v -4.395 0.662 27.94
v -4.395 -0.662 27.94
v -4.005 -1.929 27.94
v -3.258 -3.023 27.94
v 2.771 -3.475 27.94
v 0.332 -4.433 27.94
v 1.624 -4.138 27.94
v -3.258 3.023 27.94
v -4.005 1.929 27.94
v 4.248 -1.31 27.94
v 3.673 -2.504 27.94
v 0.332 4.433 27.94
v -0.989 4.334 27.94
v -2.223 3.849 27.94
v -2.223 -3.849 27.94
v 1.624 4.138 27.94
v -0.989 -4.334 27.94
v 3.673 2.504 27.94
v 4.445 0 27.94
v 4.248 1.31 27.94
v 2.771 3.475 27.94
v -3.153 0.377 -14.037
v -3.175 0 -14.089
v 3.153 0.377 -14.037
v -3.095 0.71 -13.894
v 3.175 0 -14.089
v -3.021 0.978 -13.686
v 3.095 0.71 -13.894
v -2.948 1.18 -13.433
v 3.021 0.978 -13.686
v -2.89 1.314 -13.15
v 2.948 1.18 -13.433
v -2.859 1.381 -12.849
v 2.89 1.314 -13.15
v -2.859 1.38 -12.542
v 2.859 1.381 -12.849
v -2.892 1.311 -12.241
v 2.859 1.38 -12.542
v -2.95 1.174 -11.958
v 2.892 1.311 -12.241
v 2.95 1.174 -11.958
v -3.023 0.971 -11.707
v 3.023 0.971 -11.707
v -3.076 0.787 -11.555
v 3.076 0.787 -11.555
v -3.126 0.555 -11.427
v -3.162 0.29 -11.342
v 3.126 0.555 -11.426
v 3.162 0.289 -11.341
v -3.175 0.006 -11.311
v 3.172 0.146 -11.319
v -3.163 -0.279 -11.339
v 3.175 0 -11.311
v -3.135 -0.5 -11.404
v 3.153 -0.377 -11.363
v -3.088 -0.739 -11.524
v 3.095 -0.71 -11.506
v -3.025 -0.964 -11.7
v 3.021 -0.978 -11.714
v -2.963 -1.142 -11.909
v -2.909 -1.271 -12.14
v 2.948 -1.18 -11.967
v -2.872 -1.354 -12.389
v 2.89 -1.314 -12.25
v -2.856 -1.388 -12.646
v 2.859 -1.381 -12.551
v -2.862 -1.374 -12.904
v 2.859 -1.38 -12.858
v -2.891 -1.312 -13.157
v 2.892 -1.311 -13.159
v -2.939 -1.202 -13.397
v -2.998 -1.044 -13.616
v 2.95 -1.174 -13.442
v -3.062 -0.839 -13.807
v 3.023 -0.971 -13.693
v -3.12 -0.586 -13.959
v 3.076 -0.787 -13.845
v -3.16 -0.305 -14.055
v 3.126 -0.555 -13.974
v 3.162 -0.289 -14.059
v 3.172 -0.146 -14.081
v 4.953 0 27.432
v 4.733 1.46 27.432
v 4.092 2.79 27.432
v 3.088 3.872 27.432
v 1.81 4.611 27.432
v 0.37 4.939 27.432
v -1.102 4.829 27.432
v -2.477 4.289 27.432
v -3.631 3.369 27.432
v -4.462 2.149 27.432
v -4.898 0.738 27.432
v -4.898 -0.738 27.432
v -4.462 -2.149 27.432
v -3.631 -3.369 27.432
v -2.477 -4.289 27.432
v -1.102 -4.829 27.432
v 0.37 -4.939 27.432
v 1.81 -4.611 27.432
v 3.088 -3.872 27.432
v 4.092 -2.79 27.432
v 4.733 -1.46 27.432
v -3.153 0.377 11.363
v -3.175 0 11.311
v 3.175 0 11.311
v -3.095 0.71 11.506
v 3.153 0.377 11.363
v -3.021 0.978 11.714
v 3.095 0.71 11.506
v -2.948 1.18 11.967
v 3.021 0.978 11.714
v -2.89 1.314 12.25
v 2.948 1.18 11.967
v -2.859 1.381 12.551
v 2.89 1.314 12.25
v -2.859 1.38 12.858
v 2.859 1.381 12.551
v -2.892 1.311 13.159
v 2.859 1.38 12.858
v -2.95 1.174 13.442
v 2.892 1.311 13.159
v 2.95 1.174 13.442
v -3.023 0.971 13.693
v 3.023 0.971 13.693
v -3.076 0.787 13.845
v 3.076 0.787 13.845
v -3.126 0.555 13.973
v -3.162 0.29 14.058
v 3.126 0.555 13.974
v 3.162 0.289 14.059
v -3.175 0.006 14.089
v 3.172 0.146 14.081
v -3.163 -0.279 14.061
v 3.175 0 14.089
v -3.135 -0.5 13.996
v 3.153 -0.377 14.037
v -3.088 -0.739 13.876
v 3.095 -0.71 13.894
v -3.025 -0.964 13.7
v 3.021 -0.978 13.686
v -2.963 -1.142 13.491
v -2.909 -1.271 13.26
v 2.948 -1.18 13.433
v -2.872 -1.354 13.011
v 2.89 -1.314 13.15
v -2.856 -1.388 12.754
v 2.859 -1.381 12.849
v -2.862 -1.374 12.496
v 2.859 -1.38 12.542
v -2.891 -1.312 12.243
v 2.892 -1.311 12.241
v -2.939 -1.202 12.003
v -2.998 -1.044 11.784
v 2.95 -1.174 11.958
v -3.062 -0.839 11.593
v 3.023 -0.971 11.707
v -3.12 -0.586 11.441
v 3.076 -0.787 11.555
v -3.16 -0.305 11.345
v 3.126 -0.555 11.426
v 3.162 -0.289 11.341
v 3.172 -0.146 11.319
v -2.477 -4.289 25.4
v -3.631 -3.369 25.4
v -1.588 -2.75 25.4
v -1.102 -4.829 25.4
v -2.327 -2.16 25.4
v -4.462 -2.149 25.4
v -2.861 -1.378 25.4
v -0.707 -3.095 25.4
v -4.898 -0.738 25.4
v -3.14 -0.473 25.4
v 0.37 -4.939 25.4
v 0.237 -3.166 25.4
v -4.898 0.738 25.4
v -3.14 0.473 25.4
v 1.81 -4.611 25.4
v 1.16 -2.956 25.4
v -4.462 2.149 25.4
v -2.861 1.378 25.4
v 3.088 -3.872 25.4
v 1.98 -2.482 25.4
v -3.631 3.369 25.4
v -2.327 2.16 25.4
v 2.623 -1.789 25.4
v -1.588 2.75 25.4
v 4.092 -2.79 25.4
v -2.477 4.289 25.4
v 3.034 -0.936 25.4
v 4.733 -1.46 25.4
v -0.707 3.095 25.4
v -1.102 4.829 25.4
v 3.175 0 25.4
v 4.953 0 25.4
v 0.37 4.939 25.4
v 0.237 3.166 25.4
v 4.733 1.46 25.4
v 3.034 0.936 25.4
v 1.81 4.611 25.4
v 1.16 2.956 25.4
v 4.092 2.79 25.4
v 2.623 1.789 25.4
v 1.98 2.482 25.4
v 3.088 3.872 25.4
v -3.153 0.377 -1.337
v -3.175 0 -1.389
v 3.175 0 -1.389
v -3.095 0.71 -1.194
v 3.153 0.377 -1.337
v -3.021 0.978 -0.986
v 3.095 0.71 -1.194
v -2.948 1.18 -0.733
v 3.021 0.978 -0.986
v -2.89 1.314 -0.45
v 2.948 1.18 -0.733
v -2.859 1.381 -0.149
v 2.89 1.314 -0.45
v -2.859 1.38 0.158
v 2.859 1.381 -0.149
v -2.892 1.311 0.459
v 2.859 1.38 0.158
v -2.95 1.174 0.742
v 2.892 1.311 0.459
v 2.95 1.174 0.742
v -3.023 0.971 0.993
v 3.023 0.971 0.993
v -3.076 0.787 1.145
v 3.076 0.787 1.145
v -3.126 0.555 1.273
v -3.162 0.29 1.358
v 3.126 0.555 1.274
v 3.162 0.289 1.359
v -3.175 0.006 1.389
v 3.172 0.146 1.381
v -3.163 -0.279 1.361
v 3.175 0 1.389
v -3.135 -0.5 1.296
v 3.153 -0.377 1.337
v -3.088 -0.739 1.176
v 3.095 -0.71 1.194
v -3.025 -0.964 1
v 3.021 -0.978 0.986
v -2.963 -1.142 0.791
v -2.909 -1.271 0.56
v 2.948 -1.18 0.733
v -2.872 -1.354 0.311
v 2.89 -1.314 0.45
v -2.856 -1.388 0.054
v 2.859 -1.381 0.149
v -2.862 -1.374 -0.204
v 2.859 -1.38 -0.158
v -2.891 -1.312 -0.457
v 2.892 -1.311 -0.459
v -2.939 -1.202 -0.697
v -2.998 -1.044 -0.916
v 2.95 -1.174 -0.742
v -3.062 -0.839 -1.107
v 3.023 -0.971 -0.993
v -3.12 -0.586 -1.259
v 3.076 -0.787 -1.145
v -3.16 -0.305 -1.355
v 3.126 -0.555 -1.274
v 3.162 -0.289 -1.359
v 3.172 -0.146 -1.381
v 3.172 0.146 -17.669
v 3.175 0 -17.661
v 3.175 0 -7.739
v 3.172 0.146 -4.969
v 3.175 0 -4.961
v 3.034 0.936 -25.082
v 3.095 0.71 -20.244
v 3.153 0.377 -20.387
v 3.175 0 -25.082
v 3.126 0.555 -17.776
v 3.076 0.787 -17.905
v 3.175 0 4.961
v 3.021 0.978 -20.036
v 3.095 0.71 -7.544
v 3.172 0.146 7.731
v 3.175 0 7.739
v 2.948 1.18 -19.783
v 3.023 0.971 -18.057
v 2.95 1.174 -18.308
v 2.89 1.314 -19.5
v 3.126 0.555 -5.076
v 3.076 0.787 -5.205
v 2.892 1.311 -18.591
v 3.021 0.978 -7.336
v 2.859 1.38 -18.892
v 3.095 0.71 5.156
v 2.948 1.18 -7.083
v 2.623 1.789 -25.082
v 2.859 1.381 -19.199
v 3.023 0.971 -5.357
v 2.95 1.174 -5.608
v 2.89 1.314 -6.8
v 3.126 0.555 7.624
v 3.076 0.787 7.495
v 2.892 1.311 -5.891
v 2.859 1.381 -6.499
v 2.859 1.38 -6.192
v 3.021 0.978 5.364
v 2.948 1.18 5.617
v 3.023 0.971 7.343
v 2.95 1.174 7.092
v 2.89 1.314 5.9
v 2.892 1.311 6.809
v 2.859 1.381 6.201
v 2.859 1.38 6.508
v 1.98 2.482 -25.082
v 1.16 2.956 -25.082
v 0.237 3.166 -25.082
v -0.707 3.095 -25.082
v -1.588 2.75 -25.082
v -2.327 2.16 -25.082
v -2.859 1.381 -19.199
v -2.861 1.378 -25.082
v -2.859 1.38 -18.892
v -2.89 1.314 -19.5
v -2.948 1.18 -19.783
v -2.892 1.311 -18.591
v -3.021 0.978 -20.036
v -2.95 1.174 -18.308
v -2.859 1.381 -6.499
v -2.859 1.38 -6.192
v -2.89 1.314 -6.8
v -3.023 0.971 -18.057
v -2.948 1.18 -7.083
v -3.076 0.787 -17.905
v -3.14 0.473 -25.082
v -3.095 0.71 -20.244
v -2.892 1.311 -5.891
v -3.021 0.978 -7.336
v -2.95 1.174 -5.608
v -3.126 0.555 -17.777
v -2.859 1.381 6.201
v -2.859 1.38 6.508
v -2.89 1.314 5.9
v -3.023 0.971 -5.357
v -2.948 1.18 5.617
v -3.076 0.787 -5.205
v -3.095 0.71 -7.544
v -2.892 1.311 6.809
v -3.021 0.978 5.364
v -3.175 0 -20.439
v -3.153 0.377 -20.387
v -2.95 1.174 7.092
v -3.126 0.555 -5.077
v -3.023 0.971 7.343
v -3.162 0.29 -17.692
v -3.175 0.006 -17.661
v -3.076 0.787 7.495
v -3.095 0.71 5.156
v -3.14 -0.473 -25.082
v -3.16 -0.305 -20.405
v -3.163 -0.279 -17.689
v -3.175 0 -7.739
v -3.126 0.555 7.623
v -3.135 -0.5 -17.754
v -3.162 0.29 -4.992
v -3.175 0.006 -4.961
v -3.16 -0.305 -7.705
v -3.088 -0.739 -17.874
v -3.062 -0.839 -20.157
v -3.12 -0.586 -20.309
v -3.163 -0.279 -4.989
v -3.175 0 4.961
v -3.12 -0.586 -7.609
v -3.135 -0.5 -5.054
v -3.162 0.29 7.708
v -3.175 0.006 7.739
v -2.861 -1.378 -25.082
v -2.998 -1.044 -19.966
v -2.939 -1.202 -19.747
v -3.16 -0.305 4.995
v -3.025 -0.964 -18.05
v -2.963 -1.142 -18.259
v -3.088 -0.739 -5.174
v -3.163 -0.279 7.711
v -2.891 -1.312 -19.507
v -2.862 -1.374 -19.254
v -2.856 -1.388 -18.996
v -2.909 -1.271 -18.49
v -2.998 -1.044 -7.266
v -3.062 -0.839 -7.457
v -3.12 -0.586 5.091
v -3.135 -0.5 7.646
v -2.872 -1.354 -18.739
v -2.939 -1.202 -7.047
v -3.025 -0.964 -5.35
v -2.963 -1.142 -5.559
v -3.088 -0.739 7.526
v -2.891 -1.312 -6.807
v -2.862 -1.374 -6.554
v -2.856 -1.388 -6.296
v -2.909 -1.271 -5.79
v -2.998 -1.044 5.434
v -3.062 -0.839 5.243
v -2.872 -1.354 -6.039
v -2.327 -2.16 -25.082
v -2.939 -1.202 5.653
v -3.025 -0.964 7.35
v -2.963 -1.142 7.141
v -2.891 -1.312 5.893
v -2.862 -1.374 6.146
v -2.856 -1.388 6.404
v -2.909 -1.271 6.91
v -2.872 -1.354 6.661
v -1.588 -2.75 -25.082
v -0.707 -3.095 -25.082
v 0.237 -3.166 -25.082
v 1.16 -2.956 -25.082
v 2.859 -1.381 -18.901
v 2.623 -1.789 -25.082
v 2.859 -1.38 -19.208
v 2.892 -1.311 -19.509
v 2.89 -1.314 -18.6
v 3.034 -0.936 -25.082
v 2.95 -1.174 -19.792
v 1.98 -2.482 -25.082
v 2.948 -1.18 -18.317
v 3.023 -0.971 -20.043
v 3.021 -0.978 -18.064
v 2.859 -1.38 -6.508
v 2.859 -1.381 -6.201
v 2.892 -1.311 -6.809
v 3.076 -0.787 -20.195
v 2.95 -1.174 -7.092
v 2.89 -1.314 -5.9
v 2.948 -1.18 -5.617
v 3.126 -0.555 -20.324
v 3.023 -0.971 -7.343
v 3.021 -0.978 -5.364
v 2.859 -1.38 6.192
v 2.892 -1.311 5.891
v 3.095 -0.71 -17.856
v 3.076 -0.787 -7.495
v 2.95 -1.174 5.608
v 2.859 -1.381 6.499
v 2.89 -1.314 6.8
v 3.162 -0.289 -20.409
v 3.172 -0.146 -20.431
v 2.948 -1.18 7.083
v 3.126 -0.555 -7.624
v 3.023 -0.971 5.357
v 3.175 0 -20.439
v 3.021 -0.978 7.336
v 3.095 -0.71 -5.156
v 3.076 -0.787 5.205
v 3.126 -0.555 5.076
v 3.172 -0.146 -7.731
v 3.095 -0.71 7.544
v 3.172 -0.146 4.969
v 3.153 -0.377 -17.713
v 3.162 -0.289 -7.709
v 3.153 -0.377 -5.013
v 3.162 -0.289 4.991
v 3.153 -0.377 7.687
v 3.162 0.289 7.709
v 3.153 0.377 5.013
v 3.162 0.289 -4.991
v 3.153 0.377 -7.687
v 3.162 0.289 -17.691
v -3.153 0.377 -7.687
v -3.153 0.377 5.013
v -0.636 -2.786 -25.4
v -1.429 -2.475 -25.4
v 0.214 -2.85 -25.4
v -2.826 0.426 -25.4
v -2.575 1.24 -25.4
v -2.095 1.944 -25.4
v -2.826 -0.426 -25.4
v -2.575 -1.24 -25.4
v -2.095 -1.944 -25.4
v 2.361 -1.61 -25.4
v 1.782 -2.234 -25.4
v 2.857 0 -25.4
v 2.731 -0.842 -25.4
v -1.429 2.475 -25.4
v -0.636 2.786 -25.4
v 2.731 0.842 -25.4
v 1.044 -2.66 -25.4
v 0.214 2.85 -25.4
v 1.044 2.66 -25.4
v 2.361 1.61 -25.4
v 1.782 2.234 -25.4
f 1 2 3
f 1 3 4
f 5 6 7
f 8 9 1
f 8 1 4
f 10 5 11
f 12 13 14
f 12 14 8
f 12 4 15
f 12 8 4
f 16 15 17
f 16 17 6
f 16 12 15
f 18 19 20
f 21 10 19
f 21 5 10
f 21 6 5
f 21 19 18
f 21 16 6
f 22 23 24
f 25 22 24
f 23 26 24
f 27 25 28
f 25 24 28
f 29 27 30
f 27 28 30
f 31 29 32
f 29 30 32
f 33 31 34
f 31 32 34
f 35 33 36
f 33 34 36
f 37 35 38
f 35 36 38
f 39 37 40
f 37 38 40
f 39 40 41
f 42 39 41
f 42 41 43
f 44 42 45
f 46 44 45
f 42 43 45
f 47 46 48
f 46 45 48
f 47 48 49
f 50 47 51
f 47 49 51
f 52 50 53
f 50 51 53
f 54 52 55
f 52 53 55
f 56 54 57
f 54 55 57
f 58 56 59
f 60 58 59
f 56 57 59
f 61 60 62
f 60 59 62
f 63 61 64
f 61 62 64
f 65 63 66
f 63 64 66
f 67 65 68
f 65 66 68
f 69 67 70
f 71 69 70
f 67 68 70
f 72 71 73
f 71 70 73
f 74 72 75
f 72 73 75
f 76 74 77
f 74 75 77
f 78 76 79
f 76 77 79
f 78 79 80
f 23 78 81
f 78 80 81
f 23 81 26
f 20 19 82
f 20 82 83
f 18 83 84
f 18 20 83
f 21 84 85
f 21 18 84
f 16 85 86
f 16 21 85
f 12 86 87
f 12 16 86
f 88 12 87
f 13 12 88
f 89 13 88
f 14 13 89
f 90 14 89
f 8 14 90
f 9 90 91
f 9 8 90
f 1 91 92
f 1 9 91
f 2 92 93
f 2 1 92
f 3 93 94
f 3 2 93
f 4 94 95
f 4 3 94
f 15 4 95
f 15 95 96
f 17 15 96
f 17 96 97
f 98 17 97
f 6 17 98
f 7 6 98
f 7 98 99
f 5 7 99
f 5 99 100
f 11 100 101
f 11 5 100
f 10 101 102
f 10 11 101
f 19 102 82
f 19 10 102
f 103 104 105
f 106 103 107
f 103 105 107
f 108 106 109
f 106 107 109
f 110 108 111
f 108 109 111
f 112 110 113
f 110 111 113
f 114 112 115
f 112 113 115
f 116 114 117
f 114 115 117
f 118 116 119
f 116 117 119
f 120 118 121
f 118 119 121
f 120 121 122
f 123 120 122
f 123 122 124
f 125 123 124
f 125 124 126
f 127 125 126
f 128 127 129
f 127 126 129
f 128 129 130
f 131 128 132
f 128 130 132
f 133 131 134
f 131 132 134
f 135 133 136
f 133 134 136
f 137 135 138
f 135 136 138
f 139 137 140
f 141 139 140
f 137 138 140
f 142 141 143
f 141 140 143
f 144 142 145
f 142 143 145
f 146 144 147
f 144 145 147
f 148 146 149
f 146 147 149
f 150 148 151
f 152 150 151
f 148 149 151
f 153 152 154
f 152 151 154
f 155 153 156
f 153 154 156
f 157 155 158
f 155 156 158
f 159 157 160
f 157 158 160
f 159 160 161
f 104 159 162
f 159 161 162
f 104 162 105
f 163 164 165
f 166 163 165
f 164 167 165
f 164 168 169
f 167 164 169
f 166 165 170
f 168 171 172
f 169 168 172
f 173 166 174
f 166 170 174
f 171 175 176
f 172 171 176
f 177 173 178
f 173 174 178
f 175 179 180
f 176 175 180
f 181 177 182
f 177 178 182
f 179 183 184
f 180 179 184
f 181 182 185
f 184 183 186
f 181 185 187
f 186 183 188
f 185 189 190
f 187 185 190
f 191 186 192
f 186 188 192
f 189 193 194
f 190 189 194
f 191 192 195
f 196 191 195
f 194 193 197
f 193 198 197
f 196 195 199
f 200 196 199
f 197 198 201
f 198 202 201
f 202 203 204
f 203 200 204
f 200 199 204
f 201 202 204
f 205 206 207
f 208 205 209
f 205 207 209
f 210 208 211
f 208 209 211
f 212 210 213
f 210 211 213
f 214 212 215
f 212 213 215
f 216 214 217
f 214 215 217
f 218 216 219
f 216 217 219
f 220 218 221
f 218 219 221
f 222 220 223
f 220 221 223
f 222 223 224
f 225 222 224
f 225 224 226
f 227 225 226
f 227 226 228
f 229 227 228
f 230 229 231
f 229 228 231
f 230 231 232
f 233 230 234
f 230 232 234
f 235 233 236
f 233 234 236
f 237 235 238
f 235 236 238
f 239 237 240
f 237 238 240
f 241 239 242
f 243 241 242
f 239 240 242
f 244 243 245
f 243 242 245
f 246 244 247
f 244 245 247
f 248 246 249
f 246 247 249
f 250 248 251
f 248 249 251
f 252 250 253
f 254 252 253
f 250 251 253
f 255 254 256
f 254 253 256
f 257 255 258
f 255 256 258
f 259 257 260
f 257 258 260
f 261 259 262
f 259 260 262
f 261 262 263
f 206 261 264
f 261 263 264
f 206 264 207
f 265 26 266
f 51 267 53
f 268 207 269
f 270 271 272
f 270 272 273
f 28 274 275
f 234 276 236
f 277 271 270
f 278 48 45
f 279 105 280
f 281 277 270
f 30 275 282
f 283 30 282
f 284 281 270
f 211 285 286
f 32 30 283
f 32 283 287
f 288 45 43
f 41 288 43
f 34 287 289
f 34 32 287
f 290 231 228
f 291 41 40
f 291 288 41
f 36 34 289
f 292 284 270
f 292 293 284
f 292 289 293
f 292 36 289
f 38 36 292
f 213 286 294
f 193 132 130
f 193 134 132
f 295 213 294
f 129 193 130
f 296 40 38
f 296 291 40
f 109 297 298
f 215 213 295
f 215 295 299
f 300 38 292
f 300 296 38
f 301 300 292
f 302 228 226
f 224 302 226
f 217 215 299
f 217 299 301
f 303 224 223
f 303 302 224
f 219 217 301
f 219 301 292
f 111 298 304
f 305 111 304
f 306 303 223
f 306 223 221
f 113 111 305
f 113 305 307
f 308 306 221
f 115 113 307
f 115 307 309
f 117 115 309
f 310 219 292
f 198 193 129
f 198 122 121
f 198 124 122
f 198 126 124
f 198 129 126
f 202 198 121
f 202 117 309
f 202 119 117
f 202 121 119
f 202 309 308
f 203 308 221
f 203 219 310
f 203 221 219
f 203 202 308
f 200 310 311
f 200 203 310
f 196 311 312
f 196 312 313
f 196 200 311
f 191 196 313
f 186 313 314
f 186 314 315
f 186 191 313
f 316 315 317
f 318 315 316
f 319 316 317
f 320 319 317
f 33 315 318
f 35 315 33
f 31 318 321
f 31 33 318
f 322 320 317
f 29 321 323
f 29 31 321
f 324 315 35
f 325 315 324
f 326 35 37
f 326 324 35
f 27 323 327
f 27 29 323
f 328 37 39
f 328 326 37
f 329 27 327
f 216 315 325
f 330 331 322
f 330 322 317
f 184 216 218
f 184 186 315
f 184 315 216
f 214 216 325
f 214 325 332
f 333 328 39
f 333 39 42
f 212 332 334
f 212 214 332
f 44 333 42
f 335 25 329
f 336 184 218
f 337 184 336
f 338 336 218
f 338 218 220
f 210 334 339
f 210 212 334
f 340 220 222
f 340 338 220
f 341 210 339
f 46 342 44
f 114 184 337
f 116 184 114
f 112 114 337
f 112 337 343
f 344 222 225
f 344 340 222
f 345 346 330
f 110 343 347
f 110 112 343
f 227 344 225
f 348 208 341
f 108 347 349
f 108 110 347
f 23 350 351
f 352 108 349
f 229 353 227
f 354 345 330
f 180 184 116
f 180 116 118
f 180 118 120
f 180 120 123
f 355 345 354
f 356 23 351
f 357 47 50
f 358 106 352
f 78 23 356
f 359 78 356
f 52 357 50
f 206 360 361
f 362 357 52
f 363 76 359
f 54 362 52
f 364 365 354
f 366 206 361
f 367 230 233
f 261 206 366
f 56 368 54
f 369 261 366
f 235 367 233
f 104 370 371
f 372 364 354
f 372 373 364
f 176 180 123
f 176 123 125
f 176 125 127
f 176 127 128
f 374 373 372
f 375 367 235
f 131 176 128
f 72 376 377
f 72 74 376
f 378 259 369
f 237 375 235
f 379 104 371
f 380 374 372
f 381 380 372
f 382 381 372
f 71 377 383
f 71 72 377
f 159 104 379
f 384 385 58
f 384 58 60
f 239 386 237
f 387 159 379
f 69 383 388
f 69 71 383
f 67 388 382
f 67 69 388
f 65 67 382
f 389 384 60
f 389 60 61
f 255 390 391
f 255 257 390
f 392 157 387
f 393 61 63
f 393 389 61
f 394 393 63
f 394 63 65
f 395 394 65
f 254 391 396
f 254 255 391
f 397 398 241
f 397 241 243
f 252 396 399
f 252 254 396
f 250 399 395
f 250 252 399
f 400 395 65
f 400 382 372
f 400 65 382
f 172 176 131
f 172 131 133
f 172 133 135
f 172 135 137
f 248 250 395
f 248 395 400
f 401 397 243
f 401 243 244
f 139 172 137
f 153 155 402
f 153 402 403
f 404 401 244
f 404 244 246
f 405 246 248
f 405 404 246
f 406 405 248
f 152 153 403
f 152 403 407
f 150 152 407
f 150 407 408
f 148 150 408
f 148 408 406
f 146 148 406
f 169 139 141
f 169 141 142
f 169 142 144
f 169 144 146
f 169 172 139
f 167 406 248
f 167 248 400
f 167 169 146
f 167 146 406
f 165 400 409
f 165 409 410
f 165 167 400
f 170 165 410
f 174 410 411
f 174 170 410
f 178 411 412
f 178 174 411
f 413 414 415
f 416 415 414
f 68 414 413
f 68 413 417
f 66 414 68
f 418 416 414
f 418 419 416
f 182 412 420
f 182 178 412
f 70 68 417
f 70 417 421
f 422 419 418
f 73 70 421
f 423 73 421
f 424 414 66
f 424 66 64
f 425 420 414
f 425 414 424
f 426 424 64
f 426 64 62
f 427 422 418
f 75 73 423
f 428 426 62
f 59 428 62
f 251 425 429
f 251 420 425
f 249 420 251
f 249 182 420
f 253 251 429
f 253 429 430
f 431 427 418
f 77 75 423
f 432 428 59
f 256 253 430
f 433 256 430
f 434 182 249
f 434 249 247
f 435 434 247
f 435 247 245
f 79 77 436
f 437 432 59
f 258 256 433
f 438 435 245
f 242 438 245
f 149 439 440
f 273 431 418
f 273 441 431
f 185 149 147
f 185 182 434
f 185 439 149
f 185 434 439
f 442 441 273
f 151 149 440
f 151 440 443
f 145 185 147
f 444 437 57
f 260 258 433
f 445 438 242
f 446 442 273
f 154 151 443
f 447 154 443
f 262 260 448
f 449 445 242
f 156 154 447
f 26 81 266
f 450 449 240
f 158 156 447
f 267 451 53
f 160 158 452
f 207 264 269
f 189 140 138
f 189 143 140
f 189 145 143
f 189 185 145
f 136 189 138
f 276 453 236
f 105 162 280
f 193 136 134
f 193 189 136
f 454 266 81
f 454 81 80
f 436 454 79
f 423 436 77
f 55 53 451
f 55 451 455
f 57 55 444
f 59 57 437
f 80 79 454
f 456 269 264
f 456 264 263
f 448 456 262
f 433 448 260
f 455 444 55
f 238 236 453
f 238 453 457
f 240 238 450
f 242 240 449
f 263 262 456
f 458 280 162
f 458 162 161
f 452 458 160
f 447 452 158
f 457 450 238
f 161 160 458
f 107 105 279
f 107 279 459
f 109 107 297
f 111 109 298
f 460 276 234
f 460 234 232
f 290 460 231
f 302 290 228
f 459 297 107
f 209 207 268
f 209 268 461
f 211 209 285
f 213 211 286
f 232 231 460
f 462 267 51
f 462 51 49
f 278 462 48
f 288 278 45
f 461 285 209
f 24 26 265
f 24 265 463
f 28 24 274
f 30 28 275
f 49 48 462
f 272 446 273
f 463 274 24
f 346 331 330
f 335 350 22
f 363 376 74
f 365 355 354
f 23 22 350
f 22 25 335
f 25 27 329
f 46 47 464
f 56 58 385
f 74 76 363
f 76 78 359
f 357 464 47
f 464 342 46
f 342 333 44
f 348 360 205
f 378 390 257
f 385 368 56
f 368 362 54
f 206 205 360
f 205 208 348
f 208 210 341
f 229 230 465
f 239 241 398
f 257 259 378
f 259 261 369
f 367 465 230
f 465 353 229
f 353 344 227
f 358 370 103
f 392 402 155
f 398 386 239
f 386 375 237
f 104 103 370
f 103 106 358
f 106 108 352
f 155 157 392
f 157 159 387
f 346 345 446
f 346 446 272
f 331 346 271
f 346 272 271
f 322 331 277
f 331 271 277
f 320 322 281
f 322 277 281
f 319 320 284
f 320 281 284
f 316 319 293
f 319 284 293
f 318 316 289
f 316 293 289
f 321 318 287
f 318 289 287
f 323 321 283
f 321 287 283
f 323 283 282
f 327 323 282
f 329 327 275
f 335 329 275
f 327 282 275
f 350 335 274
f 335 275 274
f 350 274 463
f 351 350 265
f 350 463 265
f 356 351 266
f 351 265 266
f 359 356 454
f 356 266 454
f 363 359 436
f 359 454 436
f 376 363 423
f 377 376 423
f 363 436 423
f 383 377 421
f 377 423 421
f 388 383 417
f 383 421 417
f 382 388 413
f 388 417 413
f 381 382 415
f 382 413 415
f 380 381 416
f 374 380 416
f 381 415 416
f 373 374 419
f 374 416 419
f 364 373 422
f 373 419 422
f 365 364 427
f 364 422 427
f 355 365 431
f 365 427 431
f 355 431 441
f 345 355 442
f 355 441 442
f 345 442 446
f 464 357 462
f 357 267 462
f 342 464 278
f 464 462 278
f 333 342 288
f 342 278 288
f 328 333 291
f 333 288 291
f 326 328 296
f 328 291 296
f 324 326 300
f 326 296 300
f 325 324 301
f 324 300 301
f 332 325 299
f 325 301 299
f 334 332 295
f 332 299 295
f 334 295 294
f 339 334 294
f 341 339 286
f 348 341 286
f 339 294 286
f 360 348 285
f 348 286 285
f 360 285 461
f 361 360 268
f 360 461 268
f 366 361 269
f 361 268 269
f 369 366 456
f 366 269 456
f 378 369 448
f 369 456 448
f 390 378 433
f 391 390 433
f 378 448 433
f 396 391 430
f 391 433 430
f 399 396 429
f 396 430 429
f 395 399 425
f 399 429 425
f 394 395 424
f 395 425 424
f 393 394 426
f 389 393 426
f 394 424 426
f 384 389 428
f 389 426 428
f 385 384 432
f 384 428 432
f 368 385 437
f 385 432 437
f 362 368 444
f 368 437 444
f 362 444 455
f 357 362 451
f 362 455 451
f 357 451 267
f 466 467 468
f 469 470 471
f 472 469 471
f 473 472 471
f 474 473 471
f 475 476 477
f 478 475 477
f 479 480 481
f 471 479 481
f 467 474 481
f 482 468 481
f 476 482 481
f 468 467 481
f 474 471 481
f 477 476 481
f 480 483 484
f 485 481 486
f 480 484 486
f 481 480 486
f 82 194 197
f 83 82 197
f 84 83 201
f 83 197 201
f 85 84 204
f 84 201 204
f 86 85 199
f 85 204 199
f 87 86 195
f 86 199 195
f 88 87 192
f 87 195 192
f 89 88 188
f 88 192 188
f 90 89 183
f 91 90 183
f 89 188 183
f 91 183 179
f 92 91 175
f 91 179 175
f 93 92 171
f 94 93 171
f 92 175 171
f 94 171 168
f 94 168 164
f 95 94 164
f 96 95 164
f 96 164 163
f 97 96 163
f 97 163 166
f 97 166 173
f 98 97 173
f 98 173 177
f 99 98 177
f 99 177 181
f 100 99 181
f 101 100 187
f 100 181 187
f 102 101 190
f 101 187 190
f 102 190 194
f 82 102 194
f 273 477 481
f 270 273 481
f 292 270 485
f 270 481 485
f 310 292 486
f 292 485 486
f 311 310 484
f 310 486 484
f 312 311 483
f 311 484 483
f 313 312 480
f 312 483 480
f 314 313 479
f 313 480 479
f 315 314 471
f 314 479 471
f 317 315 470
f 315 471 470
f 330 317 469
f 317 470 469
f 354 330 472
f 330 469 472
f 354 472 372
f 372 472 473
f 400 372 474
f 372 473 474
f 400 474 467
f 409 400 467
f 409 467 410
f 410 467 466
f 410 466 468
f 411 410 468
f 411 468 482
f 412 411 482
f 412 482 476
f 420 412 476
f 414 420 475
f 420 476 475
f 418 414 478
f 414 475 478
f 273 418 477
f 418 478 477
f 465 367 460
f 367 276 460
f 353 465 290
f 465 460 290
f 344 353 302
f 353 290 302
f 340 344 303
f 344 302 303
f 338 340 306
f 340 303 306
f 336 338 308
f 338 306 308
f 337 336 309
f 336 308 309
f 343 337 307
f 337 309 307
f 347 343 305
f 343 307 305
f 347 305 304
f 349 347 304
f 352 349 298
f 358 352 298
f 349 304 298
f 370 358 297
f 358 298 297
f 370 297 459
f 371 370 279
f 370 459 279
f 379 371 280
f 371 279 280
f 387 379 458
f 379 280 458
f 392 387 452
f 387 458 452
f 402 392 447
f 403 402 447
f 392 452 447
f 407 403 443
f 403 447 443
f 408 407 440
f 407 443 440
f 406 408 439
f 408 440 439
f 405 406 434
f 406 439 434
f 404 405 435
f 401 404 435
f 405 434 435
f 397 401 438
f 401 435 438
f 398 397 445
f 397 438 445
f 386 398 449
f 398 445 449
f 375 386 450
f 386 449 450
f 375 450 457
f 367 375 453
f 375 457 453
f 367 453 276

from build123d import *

# Parameters (mm, degrees)
SKETCH1_R       = 3.175
EXTRUDE1_DEPTH  = 25.4
SKETCH2_R       = 4.953
EXTRUDE2_DEPTH  = 2.54
CHAMFER1_SIZE   = 0.508
SKETCH3_R       = 1.3890625
EXTRUDE3_DEPTH  = 5.953
LPATTERN1_COUNT = 6
LPATTERN1_PITCH = 6.35
CHAMFER2_SIZE   = 0.3175


with BuildPart() as part:
    # Sketch1 → Extrude1 (new body, symmetric)
    with BuildSketch(Plane.XY):
        Circle(SKETCH1_R)
    extrude(amount=EXTRUDE1_DEPTH, both=True)

    # Sketch2 → Extrude2 (add)
    with BuildSketch(Plane.XY.offset(25.4)):
        Circle(SKETCH2_R)
    extrude(amount=EXTRUDE2_DEPTH)

    # Chamfer1
    chamfer1_edges = [part.edges().sort_by_distance(p)[0] for p in [
        (-4.953, 0, 27.94),
    ]]
    chamfer(chamfer1_edges, length=CHAMFER1_SIZE)

    # Sketch3 → Extrude3 (cut, symmetric)
    with BuildSketch(Plane(origin=(0, 0, 0), x_dir=(0, 0, -1), z_dir=(1, 0, 0))):
        with Locations((19.05, 0)):
            Circle(SKETCH3_R)
    extrude3 = extrude(amount=EXTRUDE3_DEPTH, both=True, mode=Mode.SUBTRACT)

    # LPattern1: Extrude3 ×6
    with Locations(*[(0, 0, i * LPATTERN1_PITCH) for i in range(1, LPATTERN1_COUNT)]):
        add(extrude3, mode=Mode.SUBTRACT)

    # Chamfer2
    chamfer2_edges = [part.edges().sort_by_distance(p)[0] for p in [
        (-3.175, 0, -25.4),
    ]]
    chamfer(chamfer2_edges, length=CHAMFER2_SIZE)


solid = part.part
